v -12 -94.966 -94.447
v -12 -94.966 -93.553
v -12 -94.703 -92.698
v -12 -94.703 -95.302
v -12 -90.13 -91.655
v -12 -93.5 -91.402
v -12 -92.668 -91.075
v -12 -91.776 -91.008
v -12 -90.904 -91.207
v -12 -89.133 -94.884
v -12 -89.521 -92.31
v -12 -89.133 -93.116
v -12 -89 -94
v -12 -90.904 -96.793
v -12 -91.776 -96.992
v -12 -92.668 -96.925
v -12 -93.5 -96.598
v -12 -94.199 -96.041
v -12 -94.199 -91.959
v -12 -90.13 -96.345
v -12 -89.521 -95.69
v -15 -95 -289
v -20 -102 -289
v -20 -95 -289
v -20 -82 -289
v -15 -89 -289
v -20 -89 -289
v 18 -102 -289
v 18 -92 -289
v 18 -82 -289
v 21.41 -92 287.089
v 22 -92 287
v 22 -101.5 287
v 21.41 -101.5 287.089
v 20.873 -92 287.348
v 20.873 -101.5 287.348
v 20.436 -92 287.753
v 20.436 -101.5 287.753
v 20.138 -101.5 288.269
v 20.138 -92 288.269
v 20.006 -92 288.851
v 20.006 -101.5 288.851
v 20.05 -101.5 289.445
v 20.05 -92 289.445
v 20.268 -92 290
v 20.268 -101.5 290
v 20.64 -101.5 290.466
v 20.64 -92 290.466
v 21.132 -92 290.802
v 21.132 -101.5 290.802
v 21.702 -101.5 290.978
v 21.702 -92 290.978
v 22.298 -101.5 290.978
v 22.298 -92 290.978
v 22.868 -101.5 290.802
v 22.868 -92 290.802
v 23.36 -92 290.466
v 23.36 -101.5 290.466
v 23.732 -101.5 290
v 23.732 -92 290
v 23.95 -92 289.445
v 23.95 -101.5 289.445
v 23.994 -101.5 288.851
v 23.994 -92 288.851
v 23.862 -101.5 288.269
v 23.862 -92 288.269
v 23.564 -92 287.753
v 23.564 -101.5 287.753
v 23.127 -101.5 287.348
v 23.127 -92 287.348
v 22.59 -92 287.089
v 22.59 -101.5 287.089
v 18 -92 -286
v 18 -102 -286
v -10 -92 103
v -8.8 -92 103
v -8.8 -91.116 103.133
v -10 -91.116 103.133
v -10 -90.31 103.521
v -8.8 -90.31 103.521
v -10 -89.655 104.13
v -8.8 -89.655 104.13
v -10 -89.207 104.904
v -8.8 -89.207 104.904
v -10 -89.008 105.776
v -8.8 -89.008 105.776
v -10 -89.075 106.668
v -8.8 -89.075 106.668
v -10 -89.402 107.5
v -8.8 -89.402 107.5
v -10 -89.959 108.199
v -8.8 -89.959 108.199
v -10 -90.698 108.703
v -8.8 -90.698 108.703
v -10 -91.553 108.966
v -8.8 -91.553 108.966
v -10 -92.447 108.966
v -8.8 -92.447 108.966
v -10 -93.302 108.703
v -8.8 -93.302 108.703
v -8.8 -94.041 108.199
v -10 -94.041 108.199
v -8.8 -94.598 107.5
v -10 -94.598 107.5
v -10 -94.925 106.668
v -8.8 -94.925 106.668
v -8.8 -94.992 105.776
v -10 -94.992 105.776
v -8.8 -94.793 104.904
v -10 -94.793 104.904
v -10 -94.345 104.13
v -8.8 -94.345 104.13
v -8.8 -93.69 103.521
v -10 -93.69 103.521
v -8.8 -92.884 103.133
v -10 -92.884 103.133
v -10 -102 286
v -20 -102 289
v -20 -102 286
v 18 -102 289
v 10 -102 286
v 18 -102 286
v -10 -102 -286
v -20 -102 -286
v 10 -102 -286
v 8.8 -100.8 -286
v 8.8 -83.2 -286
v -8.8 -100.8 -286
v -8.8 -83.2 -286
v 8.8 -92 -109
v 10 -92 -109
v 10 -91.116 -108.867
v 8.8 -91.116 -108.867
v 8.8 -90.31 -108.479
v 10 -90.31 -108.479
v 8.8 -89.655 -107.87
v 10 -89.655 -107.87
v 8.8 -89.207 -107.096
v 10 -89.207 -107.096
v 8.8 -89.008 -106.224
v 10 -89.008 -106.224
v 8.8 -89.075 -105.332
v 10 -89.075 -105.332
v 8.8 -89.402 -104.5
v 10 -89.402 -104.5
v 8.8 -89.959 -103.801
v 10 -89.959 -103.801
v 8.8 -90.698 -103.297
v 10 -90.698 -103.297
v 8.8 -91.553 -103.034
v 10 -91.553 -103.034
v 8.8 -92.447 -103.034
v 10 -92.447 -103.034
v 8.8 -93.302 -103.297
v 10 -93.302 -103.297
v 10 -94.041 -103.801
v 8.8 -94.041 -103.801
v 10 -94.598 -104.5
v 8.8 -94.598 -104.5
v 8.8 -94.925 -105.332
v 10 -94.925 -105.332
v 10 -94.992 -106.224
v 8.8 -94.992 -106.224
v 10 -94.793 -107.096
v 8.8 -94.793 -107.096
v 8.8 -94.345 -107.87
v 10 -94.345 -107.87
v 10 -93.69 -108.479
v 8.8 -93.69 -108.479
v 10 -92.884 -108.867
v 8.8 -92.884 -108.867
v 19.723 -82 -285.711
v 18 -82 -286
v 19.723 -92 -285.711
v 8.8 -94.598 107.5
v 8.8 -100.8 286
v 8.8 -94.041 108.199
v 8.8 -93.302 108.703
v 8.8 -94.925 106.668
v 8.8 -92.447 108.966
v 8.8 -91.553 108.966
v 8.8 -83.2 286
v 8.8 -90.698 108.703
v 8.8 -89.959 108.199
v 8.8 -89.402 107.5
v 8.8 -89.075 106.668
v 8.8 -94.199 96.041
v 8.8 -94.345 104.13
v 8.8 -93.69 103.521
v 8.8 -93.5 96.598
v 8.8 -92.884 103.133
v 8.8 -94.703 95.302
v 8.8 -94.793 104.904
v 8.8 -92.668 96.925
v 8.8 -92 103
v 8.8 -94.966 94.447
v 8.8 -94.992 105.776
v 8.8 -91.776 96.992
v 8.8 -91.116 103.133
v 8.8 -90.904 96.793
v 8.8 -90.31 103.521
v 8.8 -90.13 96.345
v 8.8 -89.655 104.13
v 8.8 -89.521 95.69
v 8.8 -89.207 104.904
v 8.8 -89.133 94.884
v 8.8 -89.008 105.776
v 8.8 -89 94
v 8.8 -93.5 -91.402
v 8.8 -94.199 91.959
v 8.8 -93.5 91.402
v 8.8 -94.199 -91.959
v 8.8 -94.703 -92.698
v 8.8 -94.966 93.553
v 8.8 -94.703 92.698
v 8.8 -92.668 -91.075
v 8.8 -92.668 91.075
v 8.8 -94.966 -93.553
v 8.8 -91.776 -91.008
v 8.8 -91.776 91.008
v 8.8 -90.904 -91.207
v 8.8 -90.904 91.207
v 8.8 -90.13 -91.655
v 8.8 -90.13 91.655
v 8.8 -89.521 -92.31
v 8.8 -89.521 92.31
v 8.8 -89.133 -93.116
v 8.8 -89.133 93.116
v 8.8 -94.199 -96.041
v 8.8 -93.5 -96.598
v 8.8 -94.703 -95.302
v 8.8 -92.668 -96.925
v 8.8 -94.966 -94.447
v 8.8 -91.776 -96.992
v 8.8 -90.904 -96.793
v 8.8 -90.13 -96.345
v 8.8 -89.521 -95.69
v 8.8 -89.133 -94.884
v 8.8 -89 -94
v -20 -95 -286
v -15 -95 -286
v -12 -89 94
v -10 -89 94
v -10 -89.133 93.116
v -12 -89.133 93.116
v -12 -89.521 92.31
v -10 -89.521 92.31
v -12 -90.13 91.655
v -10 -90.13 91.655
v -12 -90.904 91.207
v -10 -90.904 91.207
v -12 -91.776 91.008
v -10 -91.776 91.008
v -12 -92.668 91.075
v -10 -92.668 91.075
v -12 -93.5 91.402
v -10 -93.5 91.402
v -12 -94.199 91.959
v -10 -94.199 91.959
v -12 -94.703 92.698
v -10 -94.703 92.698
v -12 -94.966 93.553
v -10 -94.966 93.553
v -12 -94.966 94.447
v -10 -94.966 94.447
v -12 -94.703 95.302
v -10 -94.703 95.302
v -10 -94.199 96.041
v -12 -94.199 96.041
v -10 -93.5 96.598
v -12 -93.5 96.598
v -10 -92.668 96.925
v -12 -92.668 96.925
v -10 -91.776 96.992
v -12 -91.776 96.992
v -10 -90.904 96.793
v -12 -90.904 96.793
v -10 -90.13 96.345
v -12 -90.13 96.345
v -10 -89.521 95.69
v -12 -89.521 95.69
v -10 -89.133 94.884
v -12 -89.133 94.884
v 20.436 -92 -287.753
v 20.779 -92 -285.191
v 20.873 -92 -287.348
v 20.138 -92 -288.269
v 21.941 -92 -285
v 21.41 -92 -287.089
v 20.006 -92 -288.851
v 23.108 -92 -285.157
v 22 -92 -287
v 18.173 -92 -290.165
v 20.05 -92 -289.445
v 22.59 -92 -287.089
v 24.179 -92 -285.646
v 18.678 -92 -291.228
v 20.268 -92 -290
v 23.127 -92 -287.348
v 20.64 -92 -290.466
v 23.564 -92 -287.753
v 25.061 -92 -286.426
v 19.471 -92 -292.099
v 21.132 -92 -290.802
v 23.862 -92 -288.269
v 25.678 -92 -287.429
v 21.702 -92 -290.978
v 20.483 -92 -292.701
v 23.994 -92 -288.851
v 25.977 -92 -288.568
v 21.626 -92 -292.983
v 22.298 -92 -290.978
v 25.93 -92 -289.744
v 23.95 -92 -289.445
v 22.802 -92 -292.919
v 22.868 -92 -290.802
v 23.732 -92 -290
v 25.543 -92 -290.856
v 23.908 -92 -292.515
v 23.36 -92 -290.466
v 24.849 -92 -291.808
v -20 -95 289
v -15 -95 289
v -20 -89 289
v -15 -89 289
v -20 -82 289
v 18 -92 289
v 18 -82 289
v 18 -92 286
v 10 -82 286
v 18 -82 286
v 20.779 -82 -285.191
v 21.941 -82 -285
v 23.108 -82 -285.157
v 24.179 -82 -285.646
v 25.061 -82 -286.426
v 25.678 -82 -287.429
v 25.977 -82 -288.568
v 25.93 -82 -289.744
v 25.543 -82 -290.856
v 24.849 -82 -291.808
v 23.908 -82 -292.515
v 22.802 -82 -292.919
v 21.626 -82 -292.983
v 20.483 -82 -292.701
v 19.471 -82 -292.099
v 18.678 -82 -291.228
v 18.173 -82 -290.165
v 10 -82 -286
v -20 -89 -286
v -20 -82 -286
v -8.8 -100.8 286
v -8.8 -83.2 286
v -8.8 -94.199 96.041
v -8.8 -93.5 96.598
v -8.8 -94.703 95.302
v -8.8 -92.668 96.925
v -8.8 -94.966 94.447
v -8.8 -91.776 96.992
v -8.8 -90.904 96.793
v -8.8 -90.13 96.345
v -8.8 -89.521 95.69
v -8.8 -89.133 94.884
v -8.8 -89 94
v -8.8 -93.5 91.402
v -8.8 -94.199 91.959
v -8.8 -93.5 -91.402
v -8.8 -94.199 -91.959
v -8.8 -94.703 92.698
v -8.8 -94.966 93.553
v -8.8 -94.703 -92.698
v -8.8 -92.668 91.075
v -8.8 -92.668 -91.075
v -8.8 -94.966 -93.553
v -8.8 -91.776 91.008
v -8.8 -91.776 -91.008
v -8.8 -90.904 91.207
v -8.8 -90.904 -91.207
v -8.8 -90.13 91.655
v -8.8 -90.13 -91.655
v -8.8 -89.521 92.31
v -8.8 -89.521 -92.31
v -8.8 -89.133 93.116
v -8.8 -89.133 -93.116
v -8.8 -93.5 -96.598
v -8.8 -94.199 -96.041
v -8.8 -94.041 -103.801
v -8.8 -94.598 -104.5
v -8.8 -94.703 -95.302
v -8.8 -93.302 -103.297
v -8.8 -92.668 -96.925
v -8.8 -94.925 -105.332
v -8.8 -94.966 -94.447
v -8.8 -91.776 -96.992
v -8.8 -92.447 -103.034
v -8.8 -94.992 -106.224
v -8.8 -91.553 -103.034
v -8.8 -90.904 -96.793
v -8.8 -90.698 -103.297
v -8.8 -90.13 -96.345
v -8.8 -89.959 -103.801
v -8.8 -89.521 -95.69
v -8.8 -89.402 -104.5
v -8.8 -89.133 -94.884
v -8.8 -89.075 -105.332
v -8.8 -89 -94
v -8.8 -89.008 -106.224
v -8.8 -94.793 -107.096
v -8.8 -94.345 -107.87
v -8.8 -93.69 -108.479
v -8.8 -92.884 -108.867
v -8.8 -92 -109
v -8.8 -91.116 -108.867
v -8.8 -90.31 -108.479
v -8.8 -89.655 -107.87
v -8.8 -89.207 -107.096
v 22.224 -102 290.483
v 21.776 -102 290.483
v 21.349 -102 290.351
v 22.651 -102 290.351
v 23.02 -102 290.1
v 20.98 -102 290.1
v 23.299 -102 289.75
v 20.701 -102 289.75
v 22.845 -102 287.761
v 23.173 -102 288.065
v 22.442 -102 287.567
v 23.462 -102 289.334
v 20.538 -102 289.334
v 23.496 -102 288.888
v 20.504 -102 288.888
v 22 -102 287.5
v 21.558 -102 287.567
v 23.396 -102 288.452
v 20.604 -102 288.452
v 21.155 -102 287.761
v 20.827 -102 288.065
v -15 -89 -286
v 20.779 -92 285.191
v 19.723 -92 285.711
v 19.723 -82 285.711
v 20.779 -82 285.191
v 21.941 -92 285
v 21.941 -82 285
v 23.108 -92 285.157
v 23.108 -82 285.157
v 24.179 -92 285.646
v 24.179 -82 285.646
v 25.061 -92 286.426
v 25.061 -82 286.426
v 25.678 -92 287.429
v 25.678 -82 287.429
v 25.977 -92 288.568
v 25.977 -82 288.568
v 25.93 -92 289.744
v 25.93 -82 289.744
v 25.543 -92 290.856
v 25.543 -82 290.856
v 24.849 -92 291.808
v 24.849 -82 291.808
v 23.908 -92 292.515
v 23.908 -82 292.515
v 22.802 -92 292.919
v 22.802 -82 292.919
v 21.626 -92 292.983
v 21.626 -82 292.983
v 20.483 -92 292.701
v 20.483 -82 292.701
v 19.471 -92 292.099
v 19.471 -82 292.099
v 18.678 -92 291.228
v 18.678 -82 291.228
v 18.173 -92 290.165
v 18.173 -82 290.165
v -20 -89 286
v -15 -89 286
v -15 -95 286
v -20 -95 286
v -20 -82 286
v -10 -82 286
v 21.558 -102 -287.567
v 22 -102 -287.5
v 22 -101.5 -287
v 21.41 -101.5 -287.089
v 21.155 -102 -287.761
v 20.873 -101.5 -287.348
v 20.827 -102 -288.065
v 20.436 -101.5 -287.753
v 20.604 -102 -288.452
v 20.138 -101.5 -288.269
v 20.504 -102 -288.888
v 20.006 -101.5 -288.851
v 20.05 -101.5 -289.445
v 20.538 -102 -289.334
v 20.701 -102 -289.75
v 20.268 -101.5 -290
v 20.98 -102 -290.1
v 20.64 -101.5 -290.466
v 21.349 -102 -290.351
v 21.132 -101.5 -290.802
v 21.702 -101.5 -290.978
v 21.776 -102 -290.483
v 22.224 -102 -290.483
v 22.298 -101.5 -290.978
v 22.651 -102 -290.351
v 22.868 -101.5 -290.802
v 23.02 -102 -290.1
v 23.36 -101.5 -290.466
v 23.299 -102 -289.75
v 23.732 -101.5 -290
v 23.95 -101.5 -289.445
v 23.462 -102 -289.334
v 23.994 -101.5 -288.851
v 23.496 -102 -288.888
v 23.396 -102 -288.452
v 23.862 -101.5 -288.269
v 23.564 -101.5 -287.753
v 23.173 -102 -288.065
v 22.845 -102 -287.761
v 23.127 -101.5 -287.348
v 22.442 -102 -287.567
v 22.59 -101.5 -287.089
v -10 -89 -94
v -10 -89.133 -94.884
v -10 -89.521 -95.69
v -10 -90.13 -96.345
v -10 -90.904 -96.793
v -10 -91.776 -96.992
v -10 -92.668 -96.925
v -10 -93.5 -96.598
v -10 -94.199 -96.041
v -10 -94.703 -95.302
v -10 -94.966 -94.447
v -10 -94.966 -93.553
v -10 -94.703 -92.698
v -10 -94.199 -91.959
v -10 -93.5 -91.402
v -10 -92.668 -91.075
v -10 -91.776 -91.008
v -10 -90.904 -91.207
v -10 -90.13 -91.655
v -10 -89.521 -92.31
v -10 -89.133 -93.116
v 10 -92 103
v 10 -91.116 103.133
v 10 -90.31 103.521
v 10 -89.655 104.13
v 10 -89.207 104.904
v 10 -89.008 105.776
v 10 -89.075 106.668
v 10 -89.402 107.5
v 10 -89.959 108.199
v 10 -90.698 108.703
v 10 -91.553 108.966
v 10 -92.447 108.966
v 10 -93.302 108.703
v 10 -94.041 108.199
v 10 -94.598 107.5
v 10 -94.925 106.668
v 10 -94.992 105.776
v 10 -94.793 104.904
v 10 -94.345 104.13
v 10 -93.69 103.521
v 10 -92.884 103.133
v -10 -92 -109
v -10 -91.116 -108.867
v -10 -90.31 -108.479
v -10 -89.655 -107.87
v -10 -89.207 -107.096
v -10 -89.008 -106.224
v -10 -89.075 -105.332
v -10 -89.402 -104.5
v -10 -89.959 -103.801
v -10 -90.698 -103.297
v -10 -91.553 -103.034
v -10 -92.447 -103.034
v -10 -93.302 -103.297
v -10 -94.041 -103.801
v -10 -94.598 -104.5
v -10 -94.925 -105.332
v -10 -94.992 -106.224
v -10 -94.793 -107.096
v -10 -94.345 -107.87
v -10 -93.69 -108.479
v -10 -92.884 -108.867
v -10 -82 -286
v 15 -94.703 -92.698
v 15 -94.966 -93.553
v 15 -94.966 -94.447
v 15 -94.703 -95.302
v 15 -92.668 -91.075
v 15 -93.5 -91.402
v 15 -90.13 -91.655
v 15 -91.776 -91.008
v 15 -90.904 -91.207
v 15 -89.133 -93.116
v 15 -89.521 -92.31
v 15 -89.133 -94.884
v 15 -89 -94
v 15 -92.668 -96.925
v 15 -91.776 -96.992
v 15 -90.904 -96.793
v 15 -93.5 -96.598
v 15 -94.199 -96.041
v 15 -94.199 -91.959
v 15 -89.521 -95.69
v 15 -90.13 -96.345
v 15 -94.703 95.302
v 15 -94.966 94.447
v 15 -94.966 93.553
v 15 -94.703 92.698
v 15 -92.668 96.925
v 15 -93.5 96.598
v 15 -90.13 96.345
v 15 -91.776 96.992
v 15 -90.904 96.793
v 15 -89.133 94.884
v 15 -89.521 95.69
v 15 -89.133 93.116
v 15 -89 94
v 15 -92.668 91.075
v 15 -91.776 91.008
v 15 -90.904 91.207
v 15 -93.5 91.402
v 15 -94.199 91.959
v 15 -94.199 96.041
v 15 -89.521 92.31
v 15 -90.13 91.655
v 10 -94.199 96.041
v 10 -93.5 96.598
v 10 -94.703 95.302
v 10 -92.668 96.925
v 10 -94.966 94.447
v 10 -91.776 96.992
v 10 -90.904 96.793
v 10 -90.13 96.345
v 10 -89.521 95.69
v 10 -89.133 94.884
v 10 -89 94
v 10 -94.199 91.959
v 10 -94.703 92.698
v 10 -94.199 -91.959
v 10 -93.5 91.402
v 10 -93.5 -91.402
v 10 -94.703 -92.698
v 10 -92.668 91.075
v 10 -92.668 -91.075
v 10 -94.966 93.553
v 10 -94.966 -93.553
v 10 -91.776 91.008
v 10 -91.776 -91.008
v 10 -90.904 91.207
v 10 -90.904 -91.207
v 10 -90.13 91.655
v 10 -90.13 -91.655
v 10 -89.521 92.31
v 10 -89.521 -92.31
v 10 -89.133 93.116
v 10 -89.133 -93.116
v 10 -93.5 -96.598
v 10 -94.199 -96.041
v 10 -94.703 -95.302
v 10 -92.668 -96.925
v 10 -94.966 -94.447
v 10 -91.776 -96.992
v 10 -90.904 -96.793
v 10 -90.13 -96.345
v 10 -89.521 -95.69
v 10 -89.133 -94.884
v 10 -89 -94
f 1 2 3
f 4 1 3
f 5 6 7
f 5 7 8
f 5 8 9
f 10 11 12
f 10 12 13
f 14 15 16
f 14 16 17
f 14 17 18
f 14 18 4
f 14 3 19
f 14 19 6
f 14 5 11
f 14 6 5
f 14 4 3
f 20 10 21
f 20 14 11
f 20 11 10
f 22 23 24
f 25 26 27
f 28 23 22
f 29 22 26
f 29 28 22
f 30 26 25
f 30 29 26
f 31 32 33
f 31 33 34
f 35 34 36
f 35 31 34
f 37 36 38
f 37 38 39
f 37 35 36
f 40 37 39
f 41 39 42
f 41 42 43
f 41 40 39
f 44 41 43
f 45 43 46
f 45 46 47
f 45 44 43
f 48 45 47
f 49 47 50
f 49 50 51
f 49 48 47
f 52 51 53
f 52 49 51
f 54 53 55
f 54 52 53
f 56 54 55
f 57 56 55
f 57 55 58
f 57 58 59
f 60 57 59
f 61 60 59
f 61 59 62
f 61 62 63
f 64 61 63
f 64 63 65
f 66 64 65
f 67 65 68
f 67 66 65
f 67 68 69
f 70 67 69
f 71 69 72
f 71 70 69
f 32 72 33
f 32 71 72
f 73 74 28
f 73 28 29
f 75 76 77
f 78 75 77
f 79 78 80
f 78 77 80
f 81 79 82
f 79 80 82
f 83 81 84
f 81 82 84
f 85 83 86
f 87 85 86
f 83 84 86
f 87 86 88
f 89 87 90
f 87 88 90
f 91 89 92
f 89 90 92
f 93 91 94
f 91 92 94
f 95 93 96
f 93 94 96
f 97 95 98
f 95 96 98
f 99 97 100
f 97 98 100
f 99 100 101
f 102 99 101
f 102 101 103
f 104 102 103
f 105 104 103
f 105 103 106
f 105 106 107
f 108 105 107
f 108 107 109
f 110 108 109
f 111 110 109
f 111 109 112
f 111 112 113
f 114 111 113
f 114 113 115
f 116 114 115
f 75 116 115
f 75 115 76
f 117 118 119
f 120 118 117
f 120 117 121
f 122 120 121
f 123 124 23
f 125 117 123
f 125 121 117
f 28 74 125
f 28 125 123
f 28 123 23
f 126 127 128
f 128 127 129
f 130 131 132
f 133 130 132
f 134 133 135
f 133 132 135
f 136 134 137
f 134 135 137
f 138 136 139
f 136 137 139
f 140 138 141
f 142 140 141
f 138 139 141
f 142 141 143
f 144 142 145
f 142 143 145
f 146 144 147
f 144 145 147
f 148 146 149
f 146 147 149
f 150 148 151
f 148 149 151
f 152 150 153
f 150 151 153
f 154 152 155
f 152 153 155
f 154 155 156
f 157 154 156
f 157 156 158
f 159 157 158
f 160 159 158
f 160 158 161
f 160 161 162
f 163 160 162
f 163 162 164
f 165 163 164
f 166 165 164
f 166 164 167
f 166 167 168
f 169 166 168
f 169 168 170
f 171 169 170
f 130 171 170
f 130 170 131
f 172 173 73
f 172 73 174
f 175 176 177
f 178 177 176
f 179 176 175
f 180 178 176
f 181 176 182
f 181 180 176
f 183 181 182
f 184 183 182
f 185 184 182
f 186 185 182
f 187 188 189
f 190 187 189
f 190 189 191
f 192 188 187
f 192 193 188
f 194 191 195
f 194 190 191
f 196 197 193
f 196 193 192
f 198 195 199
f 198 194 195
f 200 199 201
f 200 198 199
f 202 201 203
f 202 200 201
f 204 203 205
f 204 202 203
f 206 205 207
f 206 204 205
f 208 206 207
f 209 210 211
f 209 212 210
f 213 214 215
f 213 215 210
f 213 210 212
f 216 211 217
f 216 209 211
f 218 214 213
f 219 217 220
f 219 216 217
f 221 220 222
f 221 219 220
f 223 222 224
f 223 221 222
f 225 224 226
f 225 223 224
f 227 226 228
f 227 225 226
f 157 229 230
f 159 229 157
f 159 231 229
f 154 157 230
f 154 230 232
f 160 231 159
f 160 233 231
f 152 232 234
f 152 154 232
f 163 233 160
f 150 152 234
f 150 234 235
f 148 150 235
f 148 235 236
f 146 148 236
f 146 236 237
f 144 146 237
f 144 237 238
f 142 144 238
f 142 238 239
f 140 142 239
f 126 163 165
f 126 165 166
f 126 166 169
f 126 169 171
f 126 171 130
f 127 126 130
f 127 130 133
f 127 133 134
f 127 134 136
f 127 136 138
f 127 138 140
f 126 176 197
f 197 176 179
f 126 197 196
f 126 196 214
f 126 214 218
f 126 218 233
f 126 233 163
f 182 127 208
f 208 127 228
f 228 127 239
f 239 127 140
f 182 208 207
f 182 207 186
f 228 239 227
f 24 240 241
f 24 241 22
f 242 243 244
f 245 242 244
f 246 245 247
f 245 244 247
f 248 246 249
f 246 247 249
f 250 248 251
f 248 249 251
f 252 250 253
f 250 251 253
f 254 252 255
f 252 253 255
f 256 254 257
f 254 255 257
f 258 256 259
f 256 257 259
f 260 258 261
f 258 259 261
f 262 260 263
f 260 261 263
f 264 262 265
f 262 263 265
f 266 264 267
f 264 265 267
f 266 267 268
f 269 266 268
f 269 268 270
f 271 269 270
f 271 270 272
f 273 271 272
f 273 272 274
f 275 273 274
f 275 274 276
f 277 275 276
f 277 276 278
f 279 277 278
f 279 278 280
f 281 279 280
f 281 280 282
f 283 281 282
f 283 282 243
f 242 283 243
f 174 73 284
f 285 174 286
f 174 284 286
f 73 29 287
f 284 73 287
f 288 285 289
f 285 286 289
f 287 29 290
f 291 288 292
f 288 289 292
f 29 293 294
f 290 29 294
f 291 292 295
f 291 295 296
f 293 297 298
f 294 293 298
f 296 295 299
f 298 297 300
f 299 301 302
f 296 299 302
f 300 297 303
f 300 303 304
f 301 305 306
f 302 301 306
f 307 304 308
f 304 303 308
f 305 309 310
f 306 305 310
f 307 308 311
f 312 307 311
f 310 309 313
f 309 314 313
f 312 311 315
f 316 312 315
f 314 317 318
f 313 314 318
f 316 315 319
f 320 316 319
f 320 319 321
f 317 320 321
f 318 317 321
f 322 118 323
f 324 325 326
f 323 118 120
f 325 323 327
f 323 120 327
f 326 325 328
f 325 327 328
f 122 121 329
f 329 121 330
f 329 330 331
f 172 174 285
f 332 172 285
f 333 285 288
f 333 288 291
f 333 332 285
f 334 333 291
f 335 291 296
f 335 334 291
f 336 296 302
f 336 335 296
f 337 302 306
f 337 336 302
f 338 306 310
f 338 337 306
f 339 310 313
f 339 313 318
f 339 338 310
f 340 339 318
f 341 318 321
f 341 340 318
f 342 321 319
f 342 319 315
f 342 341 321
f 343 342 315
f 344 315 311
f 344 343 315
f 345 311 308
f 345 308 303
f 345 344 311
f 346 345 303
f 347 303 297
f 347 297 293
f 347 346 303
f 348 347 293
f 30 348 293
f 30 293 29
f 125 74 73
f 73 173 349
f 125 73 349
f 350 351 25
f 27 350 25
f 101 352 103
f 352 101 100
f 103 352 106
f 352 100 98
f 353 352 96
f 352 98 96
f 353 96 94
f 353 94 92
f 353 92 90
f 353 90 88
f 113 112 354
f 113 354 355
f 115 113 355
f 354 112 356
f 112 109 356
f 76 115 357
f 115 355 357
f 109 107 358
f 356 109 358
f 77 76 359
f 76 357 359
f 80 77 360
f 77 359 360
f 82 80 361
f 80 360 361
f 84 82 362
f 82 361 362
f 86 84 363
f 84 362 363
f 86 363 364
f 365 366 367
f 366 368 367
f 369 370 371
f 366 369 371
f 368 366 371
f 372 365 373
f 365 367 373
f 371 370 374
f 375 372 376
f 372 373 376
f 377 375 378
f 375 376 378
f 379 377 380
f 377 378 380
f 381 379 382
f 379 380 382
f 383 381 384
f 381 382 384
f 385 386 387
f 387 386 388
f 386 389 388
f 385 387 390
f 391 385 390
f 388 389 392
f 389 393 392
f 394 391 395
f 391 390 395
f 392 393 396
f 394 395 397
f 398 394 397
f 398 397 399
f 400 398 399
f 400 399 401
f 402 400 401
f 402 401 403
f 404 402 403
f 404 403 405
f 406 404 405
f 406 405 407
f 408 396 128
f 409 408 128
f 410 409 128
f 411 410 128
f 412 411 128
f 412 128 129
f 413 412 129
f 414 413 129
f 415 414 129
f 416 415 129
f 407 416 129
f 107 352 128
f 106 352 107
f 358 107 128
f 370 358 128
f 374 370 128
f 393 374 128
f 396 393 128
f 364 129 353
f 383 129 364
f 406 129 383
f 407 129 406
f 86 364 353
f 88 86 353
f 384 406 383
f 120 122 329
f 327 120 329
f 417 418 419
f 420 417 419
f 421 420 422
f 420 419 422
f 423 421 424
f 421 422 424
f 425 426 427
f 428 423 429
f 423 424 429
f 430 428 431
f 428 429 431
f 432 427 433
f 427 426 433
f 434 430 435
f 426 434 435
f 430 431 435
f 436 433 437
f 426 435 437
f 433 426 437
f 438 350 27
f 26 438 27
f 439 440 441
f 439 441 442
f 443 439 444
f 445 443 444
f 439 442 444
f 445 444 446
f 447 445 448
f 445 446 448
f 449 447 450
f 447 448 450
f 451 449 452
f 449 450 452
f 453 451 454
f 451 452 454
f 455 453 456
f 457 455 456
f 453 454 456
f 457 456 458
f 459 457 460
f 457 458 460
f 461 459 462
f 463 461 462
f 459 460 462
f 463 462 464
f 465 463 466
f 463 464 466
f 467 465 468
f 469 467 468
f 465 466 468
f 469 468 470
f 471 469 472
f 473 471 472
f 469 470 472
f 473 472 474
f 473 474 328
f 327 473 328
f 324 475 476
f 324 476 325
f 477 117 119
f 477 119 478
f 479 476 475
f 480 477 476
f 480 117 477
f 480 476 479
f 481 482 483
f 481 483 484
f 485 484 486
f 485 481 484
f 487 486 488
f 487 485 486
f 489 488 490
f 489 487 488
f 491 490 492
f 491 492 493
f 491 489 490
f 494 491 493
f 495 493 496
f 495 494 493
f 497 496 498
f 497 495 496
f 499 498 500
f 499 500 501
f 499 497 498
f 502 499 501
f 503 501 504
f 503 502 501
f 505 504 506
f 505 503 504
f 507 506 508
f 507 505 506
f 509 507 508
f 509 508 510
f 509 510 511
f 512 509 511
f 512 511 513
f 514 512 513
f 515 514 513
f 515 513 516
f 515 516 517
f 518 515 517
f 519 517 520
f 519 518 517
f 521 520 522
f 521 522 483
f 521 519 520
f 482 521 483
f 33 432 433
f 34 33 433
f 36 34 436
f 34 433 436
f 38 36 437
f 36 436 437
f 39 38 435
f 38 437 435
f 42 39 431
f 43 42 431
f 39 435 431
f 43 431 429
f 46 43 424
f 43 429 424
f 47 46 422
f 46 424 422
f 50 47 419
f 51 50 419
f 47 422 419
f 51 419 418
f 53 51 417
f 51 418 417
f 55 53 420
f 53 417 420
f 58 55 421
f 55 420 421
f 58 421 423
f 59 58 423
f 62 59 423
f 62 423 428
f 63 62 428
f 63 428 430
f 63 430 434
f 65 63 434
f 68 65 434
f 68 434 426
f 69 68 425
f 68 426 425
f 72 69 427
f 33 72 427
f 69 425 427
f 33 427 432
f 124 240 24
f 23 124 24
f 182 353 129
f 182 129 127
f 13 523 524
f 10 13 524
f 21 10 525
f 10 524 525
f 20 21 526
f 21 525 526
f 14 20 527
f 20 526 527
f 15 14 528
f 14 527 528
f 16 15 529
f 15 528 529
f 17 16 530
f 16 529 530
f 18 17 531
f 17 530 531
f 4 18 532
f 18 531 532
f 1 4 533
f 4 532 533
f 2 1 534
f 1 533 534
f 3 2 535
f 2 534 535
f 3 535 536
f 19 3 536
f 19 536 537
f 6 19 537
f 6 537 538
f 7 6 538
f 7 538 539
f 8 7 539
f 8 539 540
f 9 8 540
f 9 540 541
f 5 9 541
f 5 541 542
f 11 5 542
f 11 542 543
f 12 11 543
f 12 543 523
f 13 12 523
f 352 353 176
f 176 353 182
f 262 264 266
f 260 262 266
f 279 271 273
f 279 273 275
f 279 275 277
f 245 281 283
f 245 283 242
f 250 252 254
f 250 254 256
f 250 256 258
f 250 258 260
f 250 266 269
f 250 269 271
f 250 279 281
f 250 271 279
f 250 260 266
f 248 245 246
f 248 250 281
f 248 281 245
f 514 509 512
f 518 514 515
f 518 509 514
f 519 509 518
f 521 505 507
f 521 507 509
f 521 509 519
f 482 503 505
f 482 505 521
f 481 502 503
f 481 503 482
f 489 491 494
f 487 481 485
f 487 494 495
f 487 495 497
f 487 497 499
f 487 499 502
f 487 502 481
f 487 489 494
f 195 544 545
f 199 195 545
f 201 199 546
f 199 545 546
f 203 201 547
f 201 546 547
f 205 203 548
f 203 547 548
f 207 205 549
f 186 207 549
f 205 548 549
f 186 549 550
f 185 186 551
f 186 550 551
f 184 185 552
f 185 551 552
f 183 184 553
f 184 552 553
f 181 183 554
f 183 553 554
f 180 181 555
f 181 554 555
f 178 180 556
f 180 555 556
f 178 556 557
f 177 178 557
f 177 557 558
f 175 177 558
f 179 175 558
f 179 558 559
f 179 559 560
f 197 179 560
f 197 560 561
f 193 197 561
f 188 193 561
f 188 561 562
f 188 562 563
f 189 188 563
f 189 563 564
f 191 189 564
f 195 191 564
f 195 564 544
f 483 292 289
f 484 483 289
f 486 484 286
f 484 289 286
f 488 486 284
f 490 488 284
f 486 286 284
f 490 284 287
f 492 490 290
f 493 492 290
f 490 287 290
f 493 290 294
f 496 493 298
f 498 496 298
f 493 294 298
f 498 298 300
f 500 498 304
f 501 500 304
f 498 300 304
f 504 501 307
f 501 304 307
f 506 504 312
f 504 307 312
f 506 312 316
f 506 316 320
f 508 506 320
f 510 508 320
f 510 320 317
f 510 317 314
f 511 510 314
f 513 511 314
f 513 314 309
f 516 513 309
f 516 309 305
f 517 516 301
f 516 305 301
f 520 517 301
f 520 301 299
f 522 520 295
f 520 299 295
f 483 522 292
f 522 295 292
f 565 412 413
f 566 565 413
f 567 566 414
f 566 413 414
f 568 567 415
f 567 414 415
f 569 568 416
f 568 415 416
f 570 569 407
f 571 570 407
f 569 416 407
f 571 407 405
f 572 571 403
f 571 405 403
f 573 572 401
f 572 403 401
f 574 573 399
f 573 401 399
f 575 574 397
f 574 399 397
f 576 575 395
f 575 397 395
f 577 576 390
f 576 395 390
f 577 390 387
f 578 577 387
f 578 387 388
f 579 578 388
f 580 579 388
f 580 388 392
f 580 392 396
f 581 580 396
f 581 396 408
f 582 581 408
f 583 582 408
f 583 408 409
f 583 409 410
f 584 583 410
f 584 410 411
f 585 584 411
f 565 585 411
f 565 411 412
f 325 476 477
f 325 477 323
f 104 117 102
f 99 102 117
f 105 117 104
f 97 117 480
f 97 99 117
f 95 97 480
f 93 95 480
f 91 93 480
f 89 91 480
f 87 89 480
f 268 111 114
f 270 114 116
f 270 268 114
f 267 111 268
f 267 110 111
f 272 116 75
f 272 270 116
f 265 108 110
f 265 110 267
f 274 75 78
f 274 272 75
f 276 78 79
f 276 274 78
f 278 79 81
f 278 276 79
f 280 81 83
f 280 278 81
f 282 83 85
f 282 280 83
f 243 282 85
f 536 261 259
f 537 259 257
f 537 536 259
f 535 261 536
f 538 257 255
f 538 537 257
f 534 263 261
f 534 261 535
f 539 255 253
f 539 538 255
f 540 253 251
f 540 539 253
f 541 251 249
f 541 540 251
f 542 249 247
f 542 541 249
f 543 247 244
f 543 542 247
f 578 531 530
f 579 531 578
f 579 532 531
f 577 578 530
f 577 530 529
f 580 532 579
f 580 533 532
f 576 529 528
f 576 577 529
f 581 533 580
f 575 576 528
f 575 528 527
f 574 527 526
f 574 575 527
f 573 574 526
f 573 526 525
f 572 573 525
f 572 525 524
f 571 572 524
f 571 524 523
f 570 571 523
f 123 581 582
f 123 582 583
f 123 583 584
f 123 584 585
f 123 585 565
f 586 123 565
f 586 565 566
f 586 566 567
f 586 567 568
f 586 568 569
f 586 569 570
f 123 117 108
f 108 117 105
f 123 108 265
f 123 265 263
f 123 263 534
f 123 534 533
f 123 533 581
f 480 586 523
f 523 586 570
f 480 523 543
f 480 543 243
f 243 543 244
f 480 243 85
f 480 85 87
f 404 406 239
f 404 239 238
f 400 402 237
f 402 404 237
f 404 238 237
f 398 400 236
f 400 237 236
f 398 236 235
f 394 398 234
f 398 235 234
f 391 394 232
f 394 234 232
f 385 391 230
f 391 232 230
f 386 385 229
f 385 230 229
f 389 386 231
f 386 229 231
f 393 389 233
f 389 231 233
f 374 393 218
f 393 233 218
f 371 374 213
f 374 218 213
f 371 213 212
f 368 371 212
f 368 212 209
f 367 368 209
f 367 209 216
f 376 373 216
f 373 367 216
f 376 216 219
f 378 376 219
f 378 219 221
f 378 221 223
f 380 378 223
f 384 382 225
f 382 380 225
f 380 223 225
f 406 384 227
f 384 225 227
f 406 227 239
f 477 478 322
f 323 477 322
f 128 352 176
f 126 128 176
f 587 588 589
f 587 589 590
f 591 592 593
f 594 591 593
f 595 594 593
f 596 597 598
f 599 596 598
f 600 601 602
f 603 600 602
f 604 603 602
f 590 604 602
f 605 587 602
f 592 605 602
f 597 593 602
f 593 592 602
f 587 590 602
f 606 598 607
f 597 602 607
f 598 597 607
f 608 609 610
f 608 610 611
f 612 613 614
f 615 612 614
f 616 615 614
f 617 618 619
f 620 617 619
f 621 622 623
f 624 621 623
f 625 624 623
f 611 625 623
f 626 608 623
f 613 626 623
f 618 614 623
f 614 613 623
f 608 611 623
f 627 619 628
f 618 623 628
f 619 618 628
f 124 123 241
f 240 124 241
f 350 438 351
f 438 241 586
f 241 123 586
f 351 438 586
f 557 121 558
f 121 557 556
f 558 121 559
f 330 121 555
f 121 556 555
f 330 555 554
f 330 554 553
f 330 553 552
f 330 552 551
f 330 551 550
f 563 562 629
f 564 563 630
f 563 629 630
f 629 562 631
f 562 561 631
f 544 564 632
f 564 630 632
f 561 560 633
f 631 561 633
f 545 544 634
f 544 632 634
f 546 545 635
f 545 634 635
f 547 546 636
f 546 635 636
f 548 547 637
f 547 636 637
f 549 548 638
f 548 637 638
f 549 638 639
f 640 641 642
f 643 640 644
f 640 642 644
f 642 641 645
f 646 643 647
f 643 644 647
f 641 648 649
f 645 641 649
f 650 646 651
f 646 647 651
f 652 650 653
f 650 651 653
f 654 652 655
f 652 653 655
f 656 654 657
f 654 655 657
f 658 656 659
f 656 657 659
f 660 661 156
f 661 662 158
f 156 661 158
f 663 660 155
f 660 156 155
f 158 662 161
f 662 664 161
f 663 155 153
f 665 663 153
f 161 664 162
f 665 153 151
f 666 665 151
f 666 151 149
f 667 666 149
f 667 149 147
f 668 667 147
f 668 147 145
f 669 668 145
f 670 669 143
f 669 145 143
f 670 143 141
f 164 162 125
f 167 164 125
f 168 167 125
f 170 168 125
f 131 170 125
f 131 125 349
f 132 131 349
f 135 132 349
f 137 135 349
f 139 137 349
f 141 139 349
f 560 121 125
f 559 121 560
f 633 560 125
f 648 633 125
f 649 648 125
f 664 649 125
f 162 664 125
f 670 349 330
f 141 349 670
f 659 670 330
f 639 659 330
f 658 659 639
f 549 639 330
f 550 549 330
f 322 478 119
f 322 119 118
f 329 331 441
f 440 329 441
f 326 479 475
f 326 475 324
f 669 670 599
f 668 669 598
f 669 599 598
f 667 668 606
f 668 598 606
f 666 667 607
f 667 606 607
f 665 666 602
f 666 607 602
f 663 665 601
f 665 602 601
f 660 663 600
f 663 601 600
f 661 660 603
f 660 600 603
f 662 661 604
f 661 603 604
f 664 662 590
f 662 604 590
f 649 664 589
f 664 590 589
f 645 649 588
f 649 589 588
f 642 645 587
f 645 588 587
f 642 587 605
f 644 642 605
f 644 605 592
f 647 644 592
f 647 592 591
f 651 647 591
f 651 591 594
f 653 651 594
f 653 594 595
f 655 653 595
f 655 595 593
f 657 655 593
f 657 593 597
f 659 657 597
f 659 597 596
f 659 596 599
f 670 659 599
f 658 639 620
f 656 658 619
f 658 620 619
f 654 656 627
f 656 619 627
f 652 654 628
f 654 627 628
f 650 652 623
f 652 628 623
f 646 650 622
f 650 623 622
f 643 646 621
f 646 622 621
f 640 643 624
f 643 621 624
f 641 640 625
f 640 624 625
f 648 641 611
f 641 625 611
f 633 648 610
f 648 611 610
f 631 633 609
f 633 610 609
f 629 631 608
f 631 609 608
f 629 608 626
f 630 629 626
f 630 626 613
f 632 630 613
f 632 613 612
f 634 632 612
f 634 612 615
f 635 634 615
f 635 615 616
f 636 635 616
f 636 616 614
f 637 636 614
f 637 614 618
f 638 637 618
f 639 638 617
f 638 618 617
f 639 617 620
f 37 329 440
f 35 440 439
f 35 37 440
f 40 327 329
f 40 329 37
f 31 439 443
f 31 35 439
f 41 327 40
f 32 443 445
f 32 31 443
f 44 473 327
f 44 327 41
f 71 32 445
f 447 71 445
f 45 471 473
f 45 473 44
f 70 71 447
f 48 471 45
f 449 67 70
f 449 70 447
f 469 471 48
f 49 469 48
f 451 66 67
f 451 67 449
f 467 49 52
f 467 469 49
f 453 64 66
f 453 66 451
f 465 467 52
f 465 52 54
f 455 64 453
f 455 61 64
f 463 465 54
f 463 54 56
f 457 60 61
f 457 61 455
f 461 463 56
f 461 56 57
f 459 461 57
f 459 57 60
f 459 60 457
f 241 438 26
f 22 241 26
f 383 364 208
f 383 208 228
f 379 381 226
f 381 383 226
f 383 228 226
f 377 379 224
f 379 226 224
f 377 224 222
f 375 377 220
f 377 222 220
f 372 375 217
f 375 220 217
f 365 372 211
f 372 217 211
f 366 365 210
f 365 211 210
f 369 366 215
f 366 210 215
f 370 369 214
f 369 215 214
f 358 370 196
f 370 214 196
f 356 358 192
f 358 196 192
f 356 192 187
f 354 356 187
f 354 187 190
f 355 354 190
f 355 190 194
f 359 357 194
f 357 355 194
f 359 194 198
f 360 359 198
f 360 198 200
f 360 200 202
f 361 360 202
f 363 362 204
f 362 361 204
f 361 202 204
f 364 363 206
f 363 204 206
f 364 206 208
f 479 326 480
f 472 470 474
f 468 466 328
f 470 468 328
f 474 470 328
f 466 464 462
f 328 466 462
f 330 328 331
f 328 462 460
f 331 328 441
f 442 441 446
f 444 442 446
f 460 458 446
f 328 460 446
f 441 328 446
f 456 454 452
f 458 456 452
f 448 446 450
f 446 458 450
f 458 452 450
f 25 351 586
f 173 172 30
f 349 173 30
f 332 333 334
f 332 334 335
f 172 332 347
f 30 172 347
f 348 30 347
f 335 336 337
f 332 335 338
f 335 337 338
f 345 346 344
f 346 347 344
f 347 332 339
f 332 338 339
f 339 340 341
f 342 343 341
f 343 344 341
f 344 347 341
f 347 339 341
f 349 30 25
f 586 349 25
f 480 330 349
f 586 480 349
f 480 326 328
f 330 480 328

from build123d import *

# Parameters (mm, degrees)
BOSS_EXTRUDE1_DEPTH      = 286
BOSS_EXTRUDE1_DEPTH_BACK = 286
SKETCH1_W                = 20
SKETCH1_H                = 20
SKETCH1_W_2              = 17.6
SKETCH1_H_2              = 17.6
SKETCH2_W                = 36
SKETCH2_H                = 20
BOSS_EXTRUDE2_DEPTH      = 3
SKETCH3_R                = 3
CUT_EXTRUDE1_DEPTH       = 308.748273756
BOSS_EXTRUDE3_DEPTH      = 10
SKETCH5_R                = 2
BOSS_EXTRUDE4_DEPTH      = 10
CHAMFER1_SIZE            = 0.5
SKETCH6_W                = 36
SKETCH6_H                = 20
BOSS_EXTRUDE5_DEPTH      = 3
CHAMFER2_SIZE            = 0.5
SKETCH7_W                = 3
SKETCH7_H                = 20
BOSS_EXTRUDE6_DEPTH      = 2
SKETCH8_W                = 3
SKETCH8_H                = 6
CUT_EXTRUDE2_DEPTH       = 5
BOSS_EXTRUDE7_DEPTH      = 2
BOSS_EXTRUDE7_DEPTH_BACK = 25
SKETCH9_R                = 3


with BuildPart() as part:
    # Sketch1 → Boss-Extrude1 (new, two sides: drawn at the far end of the back side and taken through both)
    with BuildSketch(Plane.XY.offset(-BOSS_EXTRUDE1_DEPTH_BACK)):
        with Locations((0, -92)):
            Rectangle(SKETCH1_W, SKETCH1_H)
        with Locations((0, -92)):
            Rectangle(SKETCH1_W_2, SKETCH1_H_2, mode=Mode.SUBTRACT)
    extrude(amount=BOSS_EXTRUDE1_DEPTH + BOSS_EXTRUDE1_DEPTH_BACK)

    # Sketch2 → Boss-Extrude2 (add)
    with BuildSketch(Plane(origin=(0, 0, -286), x_dir=(-1, 0, 0), z_dir=(0, 0, -1))):
        with Locations((0, -92)):
            Rectangle(SKETCH2_W, SKETCH2_H)
    extrude(amount=BOSS_EXTRUDE2_DEPTH)

    # Sketch3 → Cut-Extrude1 (cut, through all)
    with BuildSketch(Plane(origin=(10, 0, 0), x_dir=(0, 0, -1), z_dir=(1, 0, 0))):
        with Locations((-106, -92)):
            Circle(SKETCH3_R)
        with Locations((-94, -92)):
            Circle(SKETCH3_R)
        with Locations((94, -92)):
            Circle(SKETCH3_R)
        with Locations((106, -92)):
            Circle(SKETCH3_R)
    extrude(amount=-CUT_EXTRUDE1_DEPTH, mode=Mode.SUBTRACT)

    # Sketch4 → Boss-Extrude3 (add)
    with BuildSketch(Plane(origin=(0, -82, 0), x_dir=(1, 0, 0), z_dir=(0, 1, 0))):
        with BuildLine():
            Line((18, 286), (19.722941986, 285.711382236))
            ThreePointArc((19.722941986, 285.711382236), (25.543178803, 290.856309234), (18, 289))
            Line((18, 289), (18, 286))
        make_face()
    boss_extrude3 = extrude(amount=-BOSS_EXTRUDE3_DEPTH)

    # Sketch5 → Boss-Extrude4 (add)
    with BuildSketch(Plane.XZ.offset(92)):
        with Locations(Location((22, -289, 0), (0, 0, 90))):
            Circle(SKETCH5_R)
    boss_extrude4 = extrude(amount=BOSS_EXTRUDE4_DEPTH)

    # Chamfer1
    chamfer1_edges = [part.edges().sort_by_distance(p)[0] for p in [
        (22, -102, -291),
    ]]
    chamfer(chamfer1_edges, length=CHAMFER1_SIZE)

    # Sketch6 → Boss-Extrude5 (add)
    with BuildSketch(Plane.XY.offset(286)):
        with Locations((0, -92)):
            Rectangle(SKETCH6_W, SKETCH6_H)
    extrude(amount=BOSS_EXTRUDE5_DEPTH)

    # Mirror5: Boss-Extrude3, Boss-Extrude4 across plane
    add(boss_extrude3.mirror(Plane.XY))
    add(boss_extrude4.mirror(Plane.XY))

    # Chamfer2
    chamfer2_edges = [part.edges().sort_by_distance(p)[0] for p in [
        (22, -102, 291),
    ]]
    chamfer(chamfer2_edges, length=CHAMFER2_SIZE)

    # Sketch7 → Boss-Extrude6 (add)
    with BuildSketch(Plane.ZY.offset(18)):
        with Locations((287.5, -92)):
            Rectangle(SKETCH7_W, SKETCH7_H)
    boss_extrude6 = extrude(amount=BOSS_EXTRUDE6_DEPTH)

    # Sketch8 → Cut-Extrude2 (cut)
    with BuildSketch(Plane.ZY.offset(20)):
        with Locations((287.5, -92)):
            Rectangle(SKETCH8_W, SKETCH8_H)
    cut_extrude2 = extrude(amount=-CUT_EXTRUDE2_DEPTH, mode=Mode.SUBTRACT)

    # Mirror6: Boss-Extrude6, Cut-Extrude2 across plane
    add(boss_extrude6.mirror(Plane.XY))
    add(cut_extrude2.mirror(Plane.XY), mode=Mode.SUBTRACT)

    # Sketch9 → Boss-Extrude7 (add, two sides: drawn at the far end of the back side and taken through both)
    with BuildSketch(Plane.ZY.offset(10).offset(-BOSS_EXTRUDE7_DEPTH_BACK)):
        with Locations(Location((94, -92, 0), (0, 0, 90))):
            Circle(SKETCH9_R)
        with Locations(Location((-94, -92, 0), (0, 0, 90))):
            Circle(SKETCH9_R)
    extrude(amount=BOSS_EXTRUDE7_DEPTH + BOSS_EXTRUDE7_DEPTH_BACK)


solid = part.part
